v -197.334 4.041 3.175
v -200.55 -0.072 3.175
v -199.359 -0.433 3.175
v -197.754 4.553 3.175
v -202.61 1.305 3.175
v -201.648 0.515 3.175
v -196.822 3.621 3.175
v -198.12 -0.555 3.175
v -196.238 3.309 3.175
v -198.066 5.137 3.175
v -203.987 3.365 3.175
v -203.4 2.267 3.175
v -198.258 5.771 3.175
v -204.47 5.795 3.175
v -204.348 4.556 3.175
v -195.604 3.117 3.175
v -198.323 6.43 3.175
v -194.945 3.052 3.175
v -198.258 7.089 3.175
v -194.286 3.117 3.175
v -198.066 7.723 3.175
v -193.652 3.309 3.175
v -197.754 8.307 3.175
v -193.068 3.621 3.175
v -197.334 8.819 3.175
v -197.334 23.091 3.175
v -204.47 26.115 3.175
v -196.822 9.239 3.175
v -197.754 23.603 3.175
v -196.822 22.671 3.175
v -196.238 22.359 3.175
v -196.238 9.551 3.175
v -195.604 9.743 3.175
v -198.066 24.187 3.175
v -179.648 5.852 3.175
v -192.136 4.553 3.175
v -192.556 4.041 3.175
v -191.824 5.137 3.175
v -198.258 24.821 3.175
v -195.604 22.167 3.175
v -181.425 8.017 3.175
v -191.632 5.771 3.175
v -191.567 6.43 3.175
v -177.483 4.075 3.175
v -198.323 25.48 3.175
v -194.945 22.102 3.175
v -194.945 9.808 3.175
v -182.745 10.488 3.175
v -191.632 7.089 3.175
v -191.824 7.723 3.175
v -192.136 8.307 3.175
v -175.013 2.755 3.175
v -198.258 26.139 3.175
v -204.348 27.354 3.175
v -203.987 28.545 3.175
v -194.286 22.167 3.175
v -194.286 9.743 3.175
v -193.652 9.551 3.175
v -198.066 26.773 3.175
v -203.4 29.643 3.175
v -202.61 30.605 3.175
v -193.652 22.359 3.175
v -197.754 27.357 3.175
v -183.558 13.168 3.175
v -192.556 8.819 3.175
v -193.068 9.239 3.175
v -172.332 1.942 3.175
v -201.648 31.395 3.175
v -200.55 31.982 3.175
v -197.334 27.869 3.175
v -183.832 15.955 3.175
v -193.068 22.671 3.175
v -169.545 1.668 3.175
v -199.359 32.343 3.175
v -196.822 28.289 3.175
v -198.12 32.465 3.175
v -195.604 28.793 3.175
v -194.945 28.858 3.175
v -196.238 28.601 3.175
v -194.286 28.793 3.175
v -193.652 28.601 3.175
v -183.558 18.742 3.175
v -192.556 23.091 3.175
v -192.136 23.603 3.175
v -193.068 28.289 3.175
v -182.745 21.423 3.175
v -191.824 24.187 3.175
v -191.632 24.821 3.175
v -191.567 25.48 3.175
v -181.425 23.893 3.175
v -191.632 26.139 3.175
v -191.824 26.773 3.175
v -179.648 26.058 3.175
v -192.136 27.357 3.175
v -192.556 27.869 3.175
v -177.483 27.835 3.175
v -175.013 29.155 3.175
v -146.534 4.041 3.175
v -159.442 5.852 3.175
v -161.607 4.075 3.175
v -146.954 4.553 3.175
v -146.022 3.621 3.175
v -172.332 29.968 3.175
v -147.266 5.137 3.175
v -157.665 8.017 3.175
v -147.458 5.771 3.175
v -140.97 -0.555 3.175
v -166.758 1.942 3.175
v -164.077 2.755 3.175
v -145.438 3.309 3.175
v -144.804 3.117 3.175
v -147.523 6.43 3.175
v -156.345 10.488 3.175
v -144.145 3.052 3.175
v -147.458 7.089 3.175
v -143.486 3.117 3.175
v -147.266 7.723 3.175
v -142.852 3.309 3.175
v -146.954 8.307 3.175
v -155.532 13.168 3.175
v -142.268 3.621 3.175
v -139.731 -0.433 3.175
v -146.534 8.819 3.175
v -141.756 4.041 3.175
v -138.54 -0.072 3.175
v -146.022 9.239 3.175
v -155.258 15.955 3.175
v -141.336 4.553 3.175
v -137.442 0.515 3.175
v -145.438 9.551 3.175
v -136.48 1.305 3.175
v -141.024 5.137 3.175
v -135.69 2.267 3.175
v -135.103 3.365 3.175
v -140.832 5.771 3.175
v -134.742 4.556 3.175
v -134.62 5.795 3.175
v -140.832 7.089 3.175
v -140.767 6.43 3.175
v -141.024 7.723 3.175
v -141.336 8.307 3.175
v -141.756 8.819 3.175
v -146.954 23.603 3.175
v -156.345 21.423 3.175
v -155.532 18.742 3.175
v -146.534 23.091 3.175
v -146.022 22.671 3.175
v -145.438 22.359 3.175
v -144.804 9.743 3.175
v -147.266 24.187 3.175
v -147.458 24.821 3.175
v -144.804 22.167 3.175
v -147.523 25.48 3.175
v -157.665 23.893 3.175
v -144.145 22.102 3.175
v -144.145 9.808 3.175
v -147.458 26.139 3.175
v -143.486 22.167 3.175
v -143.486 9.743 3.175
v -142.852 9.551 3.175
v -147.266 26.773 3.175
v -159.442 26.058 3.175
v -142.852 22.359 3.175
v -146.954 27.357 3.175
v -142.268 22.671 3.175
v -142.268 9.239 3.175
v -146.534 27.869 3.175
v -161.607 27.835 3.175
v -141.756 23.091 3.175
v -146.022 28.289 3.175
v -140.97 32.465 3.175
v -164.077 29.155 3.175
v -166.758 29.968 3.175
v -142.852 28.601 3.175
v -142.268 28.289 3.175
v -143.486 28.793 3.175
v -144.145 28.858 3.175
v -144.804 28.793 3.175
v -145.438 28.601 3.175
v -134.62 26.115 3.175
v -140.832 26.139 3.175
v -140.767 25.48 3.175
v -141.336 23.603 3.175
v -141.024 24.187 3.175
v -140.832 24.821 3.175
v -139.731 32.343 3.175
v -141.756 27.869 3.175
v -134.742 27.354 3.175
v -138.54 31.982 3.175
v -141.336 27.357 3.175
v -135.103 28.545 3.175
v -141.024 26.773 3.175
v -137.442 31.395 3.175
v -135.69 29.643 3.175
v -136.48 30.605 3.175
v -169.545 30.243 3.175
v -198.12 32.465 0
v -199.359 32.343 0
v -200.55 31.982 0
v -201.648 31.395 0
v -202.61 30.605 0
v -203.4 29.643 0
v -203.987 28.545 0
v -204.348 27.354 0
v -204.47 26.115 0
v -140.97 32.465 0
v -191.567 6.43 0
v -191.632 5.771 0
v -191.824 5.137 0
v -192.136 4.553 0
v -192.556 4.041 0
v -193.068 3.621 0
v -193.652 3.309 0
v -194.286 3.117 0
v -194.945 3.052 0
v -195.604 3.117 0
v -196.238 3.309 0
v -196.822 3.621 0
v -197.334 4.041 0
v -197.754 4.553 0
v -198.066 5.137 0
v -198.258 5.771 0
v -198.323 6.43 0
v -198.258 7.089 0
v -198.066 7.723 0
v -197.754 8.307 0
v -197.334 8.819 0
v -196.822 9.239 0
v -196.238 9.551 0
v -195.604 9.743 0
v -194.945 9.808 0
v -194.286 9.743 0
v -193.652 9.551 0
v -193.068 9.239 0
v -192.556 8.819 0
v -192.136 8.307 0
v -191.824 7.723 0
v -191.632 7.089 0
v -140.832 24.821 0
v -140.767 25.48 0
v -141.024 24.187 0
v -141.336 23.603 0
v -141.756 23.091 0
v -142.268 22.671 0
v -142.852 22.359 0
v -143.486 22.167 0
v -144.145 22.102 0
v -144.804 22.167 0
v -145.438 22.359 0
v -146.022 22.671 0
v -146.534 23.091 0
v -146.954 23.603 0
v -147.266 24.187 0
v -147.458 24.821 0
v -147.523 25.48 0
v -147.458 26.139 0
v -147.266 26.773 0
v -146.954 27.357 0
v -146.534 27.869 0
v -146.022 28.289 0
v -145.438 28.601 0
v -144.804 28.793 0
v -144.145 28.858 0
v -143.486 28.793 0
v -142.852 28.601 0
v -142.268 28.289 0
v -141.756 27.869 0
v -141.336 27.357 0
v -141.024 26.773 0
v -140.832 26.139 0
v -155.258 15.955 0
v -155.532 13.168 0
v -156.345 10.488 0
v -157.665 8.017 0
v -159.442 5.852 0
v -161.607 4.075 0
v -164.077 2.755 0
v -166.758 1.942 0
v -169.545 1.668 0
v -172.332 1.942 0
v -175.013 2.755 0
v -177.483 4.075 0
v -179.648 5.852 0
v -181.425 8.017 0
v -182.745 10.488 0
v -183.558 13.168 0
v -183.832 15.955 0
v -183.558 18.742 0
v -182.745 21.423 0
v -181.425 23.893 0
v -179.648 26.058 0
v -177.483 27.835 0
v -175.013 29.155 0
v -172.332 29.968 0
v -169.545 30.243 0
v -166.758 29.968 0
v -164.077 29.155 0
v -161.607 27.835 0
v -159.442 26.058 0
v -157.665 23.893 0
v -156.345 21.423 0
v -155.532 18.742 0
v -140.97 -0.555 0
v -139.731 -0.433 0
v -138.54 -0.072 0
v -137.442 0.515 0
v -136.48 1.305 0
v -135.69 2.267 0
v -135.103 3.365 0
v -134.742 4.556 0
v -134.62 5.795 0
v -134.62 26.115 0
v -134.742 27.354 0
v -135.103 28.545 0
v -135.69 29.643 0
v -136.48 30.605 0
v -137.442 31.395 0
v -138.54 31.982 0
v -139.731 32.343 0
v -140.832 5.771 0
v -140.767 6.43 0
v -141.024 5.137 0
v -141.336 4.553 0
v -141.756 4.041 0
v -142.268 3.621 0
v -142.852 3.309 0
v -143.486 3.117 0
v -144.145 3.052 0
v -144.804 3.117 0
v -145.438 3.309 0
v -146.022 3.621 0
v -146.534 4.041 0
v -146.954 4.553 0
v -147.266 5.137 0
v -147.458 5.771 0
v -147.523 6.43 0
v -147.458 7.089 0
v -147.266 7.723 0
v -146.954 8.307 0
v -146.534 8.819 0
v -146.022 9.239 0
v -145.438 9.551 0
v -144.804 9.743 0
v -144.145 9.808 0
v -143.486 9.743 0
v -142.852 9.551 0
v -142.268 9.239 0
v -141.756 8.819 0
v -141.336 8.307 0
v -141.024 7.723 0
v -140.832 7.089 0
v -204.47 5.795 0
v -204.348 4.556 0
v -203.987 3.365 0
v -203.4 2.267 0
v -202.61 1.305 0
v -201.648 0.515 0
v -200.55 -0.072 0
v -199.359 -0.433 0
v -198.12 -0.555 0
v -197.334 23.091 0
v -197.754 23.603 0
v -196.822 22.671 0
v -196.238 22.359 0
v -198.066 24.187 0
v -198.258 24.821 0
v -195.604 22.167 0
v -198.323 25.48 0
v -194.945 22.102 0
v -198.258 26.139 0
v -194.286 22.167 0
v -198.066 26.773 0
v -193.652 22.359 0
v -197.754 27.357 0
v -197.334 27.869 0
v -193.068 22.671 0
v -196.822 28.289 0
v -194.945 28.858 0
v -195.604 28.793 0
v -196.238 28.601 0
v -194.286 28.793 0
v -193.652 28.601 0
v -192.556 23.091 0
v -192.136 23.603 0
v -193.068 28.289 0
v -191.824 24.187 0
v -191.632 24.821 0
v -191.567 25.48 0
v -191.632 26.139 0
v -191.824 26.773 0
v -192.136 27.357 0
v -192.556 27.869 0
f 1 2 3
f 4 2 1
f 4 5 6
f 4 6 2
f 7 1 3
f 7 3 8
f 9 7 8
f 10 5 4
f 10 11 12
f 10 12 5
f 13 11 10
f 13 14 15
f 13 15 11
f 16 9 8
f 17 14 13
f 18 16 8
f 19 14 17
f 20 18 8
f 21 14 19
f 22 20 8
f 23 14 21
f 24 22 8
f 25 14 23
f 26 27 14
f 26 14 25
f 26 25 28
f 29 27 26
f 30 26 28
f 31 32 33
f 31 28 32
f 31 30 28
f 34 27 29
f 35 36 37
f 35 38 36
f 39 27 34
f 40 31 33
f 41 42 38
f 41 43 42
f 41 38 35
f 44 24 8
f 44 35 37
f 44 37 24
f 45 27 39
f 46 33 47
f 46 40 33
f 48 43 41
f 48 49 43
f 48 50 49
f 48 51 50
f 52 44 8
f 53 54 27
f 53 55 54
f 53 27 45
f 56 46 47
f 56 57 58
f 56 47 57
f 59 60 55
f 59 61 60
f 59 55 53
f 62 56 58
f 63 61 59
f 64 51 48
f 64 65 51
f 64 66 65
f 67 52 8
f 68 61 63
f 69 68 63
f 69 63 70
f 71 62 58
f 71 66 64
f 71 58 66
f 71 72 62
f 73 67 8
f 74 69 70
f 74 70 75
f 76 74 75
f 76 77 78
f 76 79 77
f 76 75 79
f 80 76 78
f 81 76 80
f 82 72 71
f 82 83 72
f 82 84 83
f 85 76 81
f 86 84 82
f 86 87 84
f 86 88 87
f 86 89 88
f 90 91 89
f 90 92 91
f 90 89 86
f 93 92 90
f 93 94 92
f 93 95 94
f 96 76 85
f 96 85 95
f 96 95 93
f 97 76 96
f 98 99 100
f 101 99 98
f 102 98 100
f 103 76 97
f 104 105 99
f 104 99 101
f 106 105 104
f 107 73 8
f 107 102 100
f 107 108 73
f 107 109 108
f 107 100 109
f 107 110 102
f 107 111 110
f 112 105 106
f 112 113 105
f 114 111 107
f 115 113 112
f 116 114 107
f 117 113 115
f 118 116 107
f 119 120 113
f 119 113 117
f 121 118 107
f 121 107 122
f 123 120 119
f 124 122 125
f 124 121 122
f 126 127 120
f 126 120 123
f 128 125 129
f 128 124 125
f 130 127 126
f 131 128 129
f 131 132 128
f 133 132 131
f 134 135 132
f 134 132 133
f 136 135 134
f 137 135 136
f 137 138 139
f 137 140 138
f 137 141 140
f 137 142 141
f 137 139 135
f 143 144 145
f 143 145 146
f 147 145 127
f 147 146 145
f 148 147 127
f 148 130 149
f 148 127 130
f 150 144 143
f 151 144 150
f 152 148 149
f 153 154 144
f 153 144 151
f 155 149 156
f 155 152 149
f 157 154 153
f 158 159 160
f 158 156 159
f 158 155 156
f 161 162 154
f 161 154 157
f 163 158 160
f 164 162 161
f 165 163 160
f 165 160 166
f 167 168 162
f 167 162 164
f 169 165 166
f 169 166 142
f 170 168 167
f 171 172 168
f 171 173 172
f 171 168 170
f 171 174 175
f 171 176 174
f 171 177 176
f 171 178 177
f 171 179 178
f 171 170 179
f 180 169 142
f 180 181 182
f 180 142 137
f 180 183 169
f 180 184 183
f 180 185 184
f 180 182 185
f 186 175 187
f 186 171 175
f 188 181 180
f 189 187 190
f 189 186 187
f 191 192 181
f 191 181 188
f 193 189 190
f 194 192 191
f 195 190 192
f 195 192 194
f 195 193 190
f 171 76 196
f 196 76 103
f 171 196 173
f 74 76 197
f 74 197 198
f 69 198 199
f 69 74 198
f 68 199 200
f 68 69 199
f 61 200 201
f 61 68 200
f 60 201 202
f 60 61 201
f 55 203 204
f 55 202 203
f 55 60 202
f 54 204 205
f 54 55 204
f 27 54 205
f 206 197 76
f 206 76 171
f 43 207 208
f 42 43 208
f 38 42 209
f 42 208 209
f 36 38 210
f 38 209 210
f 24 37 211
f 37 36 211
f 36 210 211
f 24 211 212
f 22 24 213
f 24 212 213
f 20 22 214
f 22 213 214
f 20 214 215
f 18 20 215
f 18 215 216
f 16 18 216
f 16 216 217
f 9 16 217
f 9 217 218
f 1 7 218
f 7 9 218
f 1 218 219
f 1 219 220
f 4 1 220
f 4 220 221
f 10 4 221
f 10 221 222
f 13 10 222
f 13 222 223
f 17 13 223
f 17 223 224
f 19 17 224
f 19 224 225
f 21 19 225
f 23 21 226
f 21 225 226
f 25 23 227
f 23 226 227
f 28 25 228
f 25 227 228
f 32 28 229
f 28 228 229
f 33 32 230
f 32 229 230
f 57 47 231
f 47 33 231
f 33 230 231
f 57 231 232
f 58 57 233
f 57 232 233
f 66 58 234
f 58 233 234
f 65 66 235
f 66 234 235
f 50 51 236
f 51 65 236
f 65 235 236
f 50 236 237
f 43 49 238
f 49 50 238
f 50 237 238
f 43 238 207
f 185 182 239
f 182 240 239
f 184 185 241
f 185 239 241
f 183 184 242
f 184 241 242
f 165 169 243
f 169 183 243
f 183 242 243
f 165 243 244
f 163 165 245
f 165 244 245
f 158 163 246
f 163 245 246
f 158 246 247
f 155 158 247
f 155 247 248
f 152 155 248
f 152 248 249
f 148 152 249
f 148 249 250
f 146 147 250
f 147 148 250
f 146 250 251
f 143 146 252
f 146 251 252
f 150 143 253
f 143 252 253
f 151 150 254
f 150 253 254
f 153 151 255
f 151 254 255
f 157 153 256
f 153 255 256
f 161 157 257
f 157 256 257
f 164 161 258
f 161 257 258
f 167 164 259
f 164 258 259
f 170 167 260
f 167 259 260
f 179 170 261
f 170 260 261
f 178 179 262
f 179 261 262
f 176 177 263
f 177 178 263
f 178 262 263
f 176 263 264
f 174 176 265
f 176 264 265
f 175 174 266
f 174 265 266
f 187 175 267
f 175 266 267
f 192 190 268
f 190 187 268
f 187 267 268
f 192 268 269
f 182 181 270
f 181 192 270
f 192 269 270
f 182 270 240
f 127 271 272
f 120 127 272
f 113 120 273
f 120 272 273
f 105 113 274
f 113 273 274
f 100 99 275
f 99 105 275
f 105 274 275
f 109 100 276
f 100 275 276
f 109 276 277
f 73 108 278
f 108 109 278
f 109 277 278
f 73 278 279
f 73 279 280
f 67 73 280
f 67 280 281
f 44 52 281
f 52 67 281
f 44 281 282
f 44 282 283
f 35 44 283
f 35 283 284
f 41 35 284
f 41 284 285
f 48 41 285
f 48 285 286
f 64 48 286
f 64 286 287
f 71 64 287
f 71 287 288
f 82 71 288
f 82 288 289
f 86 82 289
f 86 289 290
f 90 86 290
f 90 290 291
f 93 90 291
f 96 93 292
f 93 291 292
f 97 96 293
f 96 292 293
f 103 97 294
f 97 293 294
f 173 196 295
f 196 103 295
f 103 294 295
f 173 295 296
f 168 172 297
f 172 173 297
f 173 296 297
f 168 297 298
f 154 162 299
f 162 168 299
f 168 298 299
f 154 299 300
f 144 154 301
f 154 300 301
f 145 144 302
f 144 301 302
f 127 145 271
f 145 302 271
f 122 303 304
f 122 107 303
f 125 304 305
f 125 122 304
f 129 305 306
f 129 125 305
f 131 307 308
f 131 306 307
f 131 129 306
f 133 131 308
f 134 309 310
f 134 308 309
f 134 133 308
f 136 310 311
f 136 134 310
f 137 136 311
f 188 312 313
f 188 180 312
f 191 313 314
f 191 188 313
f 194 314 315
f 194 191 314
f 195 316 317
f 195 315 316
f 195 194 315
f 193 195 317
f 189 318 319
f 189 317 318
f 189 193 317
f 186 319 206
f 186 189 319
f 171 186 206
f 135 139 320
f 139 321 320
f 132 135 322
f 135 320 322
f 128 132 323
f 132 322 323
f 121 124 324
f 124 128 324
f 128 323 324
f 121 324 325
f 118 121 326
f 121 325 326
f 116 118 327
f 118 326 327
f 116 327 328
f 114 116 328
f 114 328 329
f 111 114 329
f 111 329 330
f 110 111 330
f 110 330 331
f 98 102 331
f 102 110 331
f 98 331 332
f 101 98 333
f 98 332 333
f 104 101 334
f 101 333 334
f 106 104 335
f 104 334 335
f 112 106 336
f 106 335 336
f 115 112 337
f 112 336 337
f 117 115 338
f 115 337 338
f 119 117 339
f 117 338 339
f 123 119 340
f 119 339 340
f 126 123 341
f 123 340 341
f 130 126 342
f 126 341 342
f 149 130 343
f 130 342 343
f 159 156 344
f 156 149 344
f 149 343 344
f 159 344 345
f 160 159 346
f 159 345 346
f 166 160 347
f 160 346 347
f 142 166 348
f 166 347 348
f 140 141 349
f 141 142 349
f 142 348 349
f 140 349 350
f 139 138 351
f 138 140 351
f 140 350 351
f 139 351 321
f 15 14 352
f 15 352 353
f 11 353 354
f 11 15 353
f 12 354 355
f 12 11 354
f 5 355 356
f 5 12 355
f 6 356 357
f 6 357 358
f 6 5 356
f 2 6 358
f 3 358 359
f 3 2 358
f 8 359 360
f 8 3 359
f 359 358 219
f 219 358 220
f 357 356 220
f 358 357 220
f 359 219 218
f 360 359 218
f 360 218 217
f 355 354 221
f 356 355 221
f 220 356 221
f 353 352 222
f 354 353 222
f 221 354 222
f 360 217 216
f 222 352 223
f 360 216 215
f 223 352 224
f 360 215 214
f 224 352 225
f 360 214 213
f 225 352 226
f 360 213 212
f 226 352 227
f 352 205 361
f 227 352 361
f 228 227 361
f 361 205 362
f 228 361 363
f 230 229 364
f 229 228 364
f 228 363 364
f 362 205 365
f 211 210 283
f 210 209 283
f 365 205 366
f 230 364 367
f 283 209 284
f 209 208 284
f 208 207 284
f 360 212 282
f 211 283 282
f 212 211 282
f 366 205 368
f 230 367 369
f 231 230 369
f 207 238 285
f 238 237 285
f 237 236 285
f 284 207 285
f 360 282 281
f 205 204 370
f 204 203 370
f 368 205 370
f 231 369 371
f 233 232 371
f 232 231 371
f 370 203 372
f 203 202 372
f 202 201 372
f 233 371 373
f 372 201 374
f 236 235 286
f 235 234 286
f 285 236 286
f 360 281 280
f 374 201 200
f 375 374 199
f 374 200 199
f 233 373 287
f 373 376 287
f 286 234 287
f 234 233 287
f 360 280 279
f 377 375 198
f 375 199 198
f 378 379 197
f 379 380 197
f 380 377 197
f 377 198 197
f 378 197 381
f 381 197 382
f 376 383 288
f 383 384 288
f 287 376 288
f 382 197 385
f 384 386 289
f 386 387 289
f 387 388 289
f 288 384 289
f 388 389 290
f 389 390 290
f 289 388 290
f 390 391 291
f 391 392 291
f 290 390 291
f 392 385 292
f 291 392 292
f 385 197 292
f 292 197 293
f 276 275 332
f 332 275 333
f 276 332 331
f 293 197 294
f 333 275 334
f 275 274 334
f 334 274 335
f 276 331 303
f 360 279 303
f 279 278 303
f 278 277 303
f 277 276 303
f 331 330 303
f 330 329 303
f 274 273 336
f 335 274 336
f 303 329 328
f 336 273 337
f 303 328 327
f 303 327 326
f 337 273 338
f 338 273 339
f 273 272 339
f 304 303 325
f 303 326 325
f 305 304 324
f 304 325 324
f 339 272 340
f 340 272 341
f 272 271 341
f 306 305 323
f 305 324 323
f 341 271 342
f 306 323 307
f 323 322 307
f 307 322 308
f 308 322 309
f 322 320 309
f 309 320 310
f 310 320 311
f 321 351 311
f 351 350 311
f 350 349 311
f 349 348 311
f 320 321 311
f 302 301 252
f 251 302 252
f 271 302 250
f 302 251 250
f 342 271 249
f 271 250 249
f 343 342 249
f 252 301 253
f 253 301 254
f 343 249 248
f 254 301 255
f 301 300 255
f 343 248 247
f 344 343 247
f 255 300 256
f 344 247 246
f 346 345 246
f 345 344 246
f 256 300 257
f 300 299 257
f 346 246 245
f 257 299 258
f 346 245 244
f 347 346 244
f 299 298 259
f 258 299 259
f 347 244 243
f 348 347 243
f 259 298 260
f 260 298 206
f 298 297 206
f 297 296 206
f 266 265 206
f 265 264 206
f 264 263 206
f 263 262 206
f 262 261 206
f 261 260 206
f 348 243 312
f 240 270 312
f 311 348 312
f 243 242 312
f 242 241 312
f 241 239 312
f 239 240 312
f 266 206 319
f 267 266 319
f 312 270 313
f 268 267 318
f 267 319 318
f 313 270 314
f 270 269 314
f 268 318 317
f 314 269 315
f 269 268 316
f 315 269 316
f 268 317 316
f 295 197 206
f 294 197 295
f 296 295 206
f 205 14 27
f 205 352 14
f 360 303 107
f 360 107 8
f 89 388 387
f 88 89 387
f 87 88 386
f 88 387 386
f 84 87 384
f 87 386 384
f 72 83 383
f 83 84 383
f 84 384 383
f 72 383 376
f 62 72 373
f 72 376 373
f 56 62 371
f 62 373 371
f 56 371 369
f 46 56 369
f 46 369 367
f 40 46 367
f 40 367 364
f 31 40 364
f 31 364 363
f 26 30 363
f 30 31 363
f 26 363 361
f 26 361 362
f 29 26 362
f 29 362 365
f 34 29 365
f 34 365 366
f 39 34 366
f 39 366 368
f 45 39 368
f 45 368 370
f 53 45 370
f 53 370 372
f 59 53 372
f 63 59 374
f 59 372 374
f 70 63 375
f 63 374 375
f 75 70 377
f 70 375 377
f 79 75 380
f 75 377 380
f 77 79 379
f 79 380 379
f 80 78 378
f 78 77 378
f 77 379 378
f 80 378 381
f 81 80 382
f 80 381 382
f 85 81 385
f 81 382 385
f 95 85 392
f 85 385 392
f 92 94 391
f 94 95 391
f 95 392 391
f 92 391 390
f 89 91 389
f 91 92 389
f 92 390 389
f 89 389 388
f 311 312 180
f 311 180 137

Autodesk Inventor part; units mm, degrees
ref_plane "YZ Plane" through (0, 0, 0) normal (1, 0, 0) x (0, 1, 0)
ref_plane "XZ Plane" through (0, 0, 0) normal (0, 1, 0) x (-1, 0, 0)
ref_plane "XY Plane" through (0, 0, 0) normal (0, 0, 1) x (1, 0, 0)
sketch "Sketch1" plane through (0, 0, 0) normal (0, 0, 1) x (1, 0, 0)
  circle A0 centre (-194.945, 6.4301) radius 3.3782
  circle A1 centre (-194.945, 25.4801) radius 3.3782
  circle A2 centre (-144.145, 6.4301) radius 3.3782
  circle A3 centre (-144.145, 25.4801) radius 3.3782
  circle A4 centre (-169.545, 15.9551) radius 14.2875
  line L0 (-254, -1.8249) -> (254, -1.8249) construction
  line L1 (-247.65, 40.5304) -> (247.65, 40.5304) construction
  line L2 (-204.47, -0.5549) -> (-204.47, 32.4651)
  line L3 (-204.47, 32.4651) -> (-134.62, 32.4651)
  line L4 (-134.62, 32.4651) -> (-134.62, -0.5549)
  line L5 (-134.62, -0.5549) -> (-204.47, -0.5549)
  point P0 (0, 0)
extrude "Extrusion1" add sketch "Sketch1" along normal blind 3.175
fillet "Fillet1" radius 6.35 4 edges at (-204.47, 32.4651, 1.5875) (-204.47, -0.5549, 1.5875) (-134.62, 32.4651, 1.5875) (-134.62, -0.5549, 1.5875)
equation "\"d2\" = d1"
equation "\"d1\" = 9.525"
properties part number "V5 Shooter Bearing Support Plate" material "Aluminum-6061"
